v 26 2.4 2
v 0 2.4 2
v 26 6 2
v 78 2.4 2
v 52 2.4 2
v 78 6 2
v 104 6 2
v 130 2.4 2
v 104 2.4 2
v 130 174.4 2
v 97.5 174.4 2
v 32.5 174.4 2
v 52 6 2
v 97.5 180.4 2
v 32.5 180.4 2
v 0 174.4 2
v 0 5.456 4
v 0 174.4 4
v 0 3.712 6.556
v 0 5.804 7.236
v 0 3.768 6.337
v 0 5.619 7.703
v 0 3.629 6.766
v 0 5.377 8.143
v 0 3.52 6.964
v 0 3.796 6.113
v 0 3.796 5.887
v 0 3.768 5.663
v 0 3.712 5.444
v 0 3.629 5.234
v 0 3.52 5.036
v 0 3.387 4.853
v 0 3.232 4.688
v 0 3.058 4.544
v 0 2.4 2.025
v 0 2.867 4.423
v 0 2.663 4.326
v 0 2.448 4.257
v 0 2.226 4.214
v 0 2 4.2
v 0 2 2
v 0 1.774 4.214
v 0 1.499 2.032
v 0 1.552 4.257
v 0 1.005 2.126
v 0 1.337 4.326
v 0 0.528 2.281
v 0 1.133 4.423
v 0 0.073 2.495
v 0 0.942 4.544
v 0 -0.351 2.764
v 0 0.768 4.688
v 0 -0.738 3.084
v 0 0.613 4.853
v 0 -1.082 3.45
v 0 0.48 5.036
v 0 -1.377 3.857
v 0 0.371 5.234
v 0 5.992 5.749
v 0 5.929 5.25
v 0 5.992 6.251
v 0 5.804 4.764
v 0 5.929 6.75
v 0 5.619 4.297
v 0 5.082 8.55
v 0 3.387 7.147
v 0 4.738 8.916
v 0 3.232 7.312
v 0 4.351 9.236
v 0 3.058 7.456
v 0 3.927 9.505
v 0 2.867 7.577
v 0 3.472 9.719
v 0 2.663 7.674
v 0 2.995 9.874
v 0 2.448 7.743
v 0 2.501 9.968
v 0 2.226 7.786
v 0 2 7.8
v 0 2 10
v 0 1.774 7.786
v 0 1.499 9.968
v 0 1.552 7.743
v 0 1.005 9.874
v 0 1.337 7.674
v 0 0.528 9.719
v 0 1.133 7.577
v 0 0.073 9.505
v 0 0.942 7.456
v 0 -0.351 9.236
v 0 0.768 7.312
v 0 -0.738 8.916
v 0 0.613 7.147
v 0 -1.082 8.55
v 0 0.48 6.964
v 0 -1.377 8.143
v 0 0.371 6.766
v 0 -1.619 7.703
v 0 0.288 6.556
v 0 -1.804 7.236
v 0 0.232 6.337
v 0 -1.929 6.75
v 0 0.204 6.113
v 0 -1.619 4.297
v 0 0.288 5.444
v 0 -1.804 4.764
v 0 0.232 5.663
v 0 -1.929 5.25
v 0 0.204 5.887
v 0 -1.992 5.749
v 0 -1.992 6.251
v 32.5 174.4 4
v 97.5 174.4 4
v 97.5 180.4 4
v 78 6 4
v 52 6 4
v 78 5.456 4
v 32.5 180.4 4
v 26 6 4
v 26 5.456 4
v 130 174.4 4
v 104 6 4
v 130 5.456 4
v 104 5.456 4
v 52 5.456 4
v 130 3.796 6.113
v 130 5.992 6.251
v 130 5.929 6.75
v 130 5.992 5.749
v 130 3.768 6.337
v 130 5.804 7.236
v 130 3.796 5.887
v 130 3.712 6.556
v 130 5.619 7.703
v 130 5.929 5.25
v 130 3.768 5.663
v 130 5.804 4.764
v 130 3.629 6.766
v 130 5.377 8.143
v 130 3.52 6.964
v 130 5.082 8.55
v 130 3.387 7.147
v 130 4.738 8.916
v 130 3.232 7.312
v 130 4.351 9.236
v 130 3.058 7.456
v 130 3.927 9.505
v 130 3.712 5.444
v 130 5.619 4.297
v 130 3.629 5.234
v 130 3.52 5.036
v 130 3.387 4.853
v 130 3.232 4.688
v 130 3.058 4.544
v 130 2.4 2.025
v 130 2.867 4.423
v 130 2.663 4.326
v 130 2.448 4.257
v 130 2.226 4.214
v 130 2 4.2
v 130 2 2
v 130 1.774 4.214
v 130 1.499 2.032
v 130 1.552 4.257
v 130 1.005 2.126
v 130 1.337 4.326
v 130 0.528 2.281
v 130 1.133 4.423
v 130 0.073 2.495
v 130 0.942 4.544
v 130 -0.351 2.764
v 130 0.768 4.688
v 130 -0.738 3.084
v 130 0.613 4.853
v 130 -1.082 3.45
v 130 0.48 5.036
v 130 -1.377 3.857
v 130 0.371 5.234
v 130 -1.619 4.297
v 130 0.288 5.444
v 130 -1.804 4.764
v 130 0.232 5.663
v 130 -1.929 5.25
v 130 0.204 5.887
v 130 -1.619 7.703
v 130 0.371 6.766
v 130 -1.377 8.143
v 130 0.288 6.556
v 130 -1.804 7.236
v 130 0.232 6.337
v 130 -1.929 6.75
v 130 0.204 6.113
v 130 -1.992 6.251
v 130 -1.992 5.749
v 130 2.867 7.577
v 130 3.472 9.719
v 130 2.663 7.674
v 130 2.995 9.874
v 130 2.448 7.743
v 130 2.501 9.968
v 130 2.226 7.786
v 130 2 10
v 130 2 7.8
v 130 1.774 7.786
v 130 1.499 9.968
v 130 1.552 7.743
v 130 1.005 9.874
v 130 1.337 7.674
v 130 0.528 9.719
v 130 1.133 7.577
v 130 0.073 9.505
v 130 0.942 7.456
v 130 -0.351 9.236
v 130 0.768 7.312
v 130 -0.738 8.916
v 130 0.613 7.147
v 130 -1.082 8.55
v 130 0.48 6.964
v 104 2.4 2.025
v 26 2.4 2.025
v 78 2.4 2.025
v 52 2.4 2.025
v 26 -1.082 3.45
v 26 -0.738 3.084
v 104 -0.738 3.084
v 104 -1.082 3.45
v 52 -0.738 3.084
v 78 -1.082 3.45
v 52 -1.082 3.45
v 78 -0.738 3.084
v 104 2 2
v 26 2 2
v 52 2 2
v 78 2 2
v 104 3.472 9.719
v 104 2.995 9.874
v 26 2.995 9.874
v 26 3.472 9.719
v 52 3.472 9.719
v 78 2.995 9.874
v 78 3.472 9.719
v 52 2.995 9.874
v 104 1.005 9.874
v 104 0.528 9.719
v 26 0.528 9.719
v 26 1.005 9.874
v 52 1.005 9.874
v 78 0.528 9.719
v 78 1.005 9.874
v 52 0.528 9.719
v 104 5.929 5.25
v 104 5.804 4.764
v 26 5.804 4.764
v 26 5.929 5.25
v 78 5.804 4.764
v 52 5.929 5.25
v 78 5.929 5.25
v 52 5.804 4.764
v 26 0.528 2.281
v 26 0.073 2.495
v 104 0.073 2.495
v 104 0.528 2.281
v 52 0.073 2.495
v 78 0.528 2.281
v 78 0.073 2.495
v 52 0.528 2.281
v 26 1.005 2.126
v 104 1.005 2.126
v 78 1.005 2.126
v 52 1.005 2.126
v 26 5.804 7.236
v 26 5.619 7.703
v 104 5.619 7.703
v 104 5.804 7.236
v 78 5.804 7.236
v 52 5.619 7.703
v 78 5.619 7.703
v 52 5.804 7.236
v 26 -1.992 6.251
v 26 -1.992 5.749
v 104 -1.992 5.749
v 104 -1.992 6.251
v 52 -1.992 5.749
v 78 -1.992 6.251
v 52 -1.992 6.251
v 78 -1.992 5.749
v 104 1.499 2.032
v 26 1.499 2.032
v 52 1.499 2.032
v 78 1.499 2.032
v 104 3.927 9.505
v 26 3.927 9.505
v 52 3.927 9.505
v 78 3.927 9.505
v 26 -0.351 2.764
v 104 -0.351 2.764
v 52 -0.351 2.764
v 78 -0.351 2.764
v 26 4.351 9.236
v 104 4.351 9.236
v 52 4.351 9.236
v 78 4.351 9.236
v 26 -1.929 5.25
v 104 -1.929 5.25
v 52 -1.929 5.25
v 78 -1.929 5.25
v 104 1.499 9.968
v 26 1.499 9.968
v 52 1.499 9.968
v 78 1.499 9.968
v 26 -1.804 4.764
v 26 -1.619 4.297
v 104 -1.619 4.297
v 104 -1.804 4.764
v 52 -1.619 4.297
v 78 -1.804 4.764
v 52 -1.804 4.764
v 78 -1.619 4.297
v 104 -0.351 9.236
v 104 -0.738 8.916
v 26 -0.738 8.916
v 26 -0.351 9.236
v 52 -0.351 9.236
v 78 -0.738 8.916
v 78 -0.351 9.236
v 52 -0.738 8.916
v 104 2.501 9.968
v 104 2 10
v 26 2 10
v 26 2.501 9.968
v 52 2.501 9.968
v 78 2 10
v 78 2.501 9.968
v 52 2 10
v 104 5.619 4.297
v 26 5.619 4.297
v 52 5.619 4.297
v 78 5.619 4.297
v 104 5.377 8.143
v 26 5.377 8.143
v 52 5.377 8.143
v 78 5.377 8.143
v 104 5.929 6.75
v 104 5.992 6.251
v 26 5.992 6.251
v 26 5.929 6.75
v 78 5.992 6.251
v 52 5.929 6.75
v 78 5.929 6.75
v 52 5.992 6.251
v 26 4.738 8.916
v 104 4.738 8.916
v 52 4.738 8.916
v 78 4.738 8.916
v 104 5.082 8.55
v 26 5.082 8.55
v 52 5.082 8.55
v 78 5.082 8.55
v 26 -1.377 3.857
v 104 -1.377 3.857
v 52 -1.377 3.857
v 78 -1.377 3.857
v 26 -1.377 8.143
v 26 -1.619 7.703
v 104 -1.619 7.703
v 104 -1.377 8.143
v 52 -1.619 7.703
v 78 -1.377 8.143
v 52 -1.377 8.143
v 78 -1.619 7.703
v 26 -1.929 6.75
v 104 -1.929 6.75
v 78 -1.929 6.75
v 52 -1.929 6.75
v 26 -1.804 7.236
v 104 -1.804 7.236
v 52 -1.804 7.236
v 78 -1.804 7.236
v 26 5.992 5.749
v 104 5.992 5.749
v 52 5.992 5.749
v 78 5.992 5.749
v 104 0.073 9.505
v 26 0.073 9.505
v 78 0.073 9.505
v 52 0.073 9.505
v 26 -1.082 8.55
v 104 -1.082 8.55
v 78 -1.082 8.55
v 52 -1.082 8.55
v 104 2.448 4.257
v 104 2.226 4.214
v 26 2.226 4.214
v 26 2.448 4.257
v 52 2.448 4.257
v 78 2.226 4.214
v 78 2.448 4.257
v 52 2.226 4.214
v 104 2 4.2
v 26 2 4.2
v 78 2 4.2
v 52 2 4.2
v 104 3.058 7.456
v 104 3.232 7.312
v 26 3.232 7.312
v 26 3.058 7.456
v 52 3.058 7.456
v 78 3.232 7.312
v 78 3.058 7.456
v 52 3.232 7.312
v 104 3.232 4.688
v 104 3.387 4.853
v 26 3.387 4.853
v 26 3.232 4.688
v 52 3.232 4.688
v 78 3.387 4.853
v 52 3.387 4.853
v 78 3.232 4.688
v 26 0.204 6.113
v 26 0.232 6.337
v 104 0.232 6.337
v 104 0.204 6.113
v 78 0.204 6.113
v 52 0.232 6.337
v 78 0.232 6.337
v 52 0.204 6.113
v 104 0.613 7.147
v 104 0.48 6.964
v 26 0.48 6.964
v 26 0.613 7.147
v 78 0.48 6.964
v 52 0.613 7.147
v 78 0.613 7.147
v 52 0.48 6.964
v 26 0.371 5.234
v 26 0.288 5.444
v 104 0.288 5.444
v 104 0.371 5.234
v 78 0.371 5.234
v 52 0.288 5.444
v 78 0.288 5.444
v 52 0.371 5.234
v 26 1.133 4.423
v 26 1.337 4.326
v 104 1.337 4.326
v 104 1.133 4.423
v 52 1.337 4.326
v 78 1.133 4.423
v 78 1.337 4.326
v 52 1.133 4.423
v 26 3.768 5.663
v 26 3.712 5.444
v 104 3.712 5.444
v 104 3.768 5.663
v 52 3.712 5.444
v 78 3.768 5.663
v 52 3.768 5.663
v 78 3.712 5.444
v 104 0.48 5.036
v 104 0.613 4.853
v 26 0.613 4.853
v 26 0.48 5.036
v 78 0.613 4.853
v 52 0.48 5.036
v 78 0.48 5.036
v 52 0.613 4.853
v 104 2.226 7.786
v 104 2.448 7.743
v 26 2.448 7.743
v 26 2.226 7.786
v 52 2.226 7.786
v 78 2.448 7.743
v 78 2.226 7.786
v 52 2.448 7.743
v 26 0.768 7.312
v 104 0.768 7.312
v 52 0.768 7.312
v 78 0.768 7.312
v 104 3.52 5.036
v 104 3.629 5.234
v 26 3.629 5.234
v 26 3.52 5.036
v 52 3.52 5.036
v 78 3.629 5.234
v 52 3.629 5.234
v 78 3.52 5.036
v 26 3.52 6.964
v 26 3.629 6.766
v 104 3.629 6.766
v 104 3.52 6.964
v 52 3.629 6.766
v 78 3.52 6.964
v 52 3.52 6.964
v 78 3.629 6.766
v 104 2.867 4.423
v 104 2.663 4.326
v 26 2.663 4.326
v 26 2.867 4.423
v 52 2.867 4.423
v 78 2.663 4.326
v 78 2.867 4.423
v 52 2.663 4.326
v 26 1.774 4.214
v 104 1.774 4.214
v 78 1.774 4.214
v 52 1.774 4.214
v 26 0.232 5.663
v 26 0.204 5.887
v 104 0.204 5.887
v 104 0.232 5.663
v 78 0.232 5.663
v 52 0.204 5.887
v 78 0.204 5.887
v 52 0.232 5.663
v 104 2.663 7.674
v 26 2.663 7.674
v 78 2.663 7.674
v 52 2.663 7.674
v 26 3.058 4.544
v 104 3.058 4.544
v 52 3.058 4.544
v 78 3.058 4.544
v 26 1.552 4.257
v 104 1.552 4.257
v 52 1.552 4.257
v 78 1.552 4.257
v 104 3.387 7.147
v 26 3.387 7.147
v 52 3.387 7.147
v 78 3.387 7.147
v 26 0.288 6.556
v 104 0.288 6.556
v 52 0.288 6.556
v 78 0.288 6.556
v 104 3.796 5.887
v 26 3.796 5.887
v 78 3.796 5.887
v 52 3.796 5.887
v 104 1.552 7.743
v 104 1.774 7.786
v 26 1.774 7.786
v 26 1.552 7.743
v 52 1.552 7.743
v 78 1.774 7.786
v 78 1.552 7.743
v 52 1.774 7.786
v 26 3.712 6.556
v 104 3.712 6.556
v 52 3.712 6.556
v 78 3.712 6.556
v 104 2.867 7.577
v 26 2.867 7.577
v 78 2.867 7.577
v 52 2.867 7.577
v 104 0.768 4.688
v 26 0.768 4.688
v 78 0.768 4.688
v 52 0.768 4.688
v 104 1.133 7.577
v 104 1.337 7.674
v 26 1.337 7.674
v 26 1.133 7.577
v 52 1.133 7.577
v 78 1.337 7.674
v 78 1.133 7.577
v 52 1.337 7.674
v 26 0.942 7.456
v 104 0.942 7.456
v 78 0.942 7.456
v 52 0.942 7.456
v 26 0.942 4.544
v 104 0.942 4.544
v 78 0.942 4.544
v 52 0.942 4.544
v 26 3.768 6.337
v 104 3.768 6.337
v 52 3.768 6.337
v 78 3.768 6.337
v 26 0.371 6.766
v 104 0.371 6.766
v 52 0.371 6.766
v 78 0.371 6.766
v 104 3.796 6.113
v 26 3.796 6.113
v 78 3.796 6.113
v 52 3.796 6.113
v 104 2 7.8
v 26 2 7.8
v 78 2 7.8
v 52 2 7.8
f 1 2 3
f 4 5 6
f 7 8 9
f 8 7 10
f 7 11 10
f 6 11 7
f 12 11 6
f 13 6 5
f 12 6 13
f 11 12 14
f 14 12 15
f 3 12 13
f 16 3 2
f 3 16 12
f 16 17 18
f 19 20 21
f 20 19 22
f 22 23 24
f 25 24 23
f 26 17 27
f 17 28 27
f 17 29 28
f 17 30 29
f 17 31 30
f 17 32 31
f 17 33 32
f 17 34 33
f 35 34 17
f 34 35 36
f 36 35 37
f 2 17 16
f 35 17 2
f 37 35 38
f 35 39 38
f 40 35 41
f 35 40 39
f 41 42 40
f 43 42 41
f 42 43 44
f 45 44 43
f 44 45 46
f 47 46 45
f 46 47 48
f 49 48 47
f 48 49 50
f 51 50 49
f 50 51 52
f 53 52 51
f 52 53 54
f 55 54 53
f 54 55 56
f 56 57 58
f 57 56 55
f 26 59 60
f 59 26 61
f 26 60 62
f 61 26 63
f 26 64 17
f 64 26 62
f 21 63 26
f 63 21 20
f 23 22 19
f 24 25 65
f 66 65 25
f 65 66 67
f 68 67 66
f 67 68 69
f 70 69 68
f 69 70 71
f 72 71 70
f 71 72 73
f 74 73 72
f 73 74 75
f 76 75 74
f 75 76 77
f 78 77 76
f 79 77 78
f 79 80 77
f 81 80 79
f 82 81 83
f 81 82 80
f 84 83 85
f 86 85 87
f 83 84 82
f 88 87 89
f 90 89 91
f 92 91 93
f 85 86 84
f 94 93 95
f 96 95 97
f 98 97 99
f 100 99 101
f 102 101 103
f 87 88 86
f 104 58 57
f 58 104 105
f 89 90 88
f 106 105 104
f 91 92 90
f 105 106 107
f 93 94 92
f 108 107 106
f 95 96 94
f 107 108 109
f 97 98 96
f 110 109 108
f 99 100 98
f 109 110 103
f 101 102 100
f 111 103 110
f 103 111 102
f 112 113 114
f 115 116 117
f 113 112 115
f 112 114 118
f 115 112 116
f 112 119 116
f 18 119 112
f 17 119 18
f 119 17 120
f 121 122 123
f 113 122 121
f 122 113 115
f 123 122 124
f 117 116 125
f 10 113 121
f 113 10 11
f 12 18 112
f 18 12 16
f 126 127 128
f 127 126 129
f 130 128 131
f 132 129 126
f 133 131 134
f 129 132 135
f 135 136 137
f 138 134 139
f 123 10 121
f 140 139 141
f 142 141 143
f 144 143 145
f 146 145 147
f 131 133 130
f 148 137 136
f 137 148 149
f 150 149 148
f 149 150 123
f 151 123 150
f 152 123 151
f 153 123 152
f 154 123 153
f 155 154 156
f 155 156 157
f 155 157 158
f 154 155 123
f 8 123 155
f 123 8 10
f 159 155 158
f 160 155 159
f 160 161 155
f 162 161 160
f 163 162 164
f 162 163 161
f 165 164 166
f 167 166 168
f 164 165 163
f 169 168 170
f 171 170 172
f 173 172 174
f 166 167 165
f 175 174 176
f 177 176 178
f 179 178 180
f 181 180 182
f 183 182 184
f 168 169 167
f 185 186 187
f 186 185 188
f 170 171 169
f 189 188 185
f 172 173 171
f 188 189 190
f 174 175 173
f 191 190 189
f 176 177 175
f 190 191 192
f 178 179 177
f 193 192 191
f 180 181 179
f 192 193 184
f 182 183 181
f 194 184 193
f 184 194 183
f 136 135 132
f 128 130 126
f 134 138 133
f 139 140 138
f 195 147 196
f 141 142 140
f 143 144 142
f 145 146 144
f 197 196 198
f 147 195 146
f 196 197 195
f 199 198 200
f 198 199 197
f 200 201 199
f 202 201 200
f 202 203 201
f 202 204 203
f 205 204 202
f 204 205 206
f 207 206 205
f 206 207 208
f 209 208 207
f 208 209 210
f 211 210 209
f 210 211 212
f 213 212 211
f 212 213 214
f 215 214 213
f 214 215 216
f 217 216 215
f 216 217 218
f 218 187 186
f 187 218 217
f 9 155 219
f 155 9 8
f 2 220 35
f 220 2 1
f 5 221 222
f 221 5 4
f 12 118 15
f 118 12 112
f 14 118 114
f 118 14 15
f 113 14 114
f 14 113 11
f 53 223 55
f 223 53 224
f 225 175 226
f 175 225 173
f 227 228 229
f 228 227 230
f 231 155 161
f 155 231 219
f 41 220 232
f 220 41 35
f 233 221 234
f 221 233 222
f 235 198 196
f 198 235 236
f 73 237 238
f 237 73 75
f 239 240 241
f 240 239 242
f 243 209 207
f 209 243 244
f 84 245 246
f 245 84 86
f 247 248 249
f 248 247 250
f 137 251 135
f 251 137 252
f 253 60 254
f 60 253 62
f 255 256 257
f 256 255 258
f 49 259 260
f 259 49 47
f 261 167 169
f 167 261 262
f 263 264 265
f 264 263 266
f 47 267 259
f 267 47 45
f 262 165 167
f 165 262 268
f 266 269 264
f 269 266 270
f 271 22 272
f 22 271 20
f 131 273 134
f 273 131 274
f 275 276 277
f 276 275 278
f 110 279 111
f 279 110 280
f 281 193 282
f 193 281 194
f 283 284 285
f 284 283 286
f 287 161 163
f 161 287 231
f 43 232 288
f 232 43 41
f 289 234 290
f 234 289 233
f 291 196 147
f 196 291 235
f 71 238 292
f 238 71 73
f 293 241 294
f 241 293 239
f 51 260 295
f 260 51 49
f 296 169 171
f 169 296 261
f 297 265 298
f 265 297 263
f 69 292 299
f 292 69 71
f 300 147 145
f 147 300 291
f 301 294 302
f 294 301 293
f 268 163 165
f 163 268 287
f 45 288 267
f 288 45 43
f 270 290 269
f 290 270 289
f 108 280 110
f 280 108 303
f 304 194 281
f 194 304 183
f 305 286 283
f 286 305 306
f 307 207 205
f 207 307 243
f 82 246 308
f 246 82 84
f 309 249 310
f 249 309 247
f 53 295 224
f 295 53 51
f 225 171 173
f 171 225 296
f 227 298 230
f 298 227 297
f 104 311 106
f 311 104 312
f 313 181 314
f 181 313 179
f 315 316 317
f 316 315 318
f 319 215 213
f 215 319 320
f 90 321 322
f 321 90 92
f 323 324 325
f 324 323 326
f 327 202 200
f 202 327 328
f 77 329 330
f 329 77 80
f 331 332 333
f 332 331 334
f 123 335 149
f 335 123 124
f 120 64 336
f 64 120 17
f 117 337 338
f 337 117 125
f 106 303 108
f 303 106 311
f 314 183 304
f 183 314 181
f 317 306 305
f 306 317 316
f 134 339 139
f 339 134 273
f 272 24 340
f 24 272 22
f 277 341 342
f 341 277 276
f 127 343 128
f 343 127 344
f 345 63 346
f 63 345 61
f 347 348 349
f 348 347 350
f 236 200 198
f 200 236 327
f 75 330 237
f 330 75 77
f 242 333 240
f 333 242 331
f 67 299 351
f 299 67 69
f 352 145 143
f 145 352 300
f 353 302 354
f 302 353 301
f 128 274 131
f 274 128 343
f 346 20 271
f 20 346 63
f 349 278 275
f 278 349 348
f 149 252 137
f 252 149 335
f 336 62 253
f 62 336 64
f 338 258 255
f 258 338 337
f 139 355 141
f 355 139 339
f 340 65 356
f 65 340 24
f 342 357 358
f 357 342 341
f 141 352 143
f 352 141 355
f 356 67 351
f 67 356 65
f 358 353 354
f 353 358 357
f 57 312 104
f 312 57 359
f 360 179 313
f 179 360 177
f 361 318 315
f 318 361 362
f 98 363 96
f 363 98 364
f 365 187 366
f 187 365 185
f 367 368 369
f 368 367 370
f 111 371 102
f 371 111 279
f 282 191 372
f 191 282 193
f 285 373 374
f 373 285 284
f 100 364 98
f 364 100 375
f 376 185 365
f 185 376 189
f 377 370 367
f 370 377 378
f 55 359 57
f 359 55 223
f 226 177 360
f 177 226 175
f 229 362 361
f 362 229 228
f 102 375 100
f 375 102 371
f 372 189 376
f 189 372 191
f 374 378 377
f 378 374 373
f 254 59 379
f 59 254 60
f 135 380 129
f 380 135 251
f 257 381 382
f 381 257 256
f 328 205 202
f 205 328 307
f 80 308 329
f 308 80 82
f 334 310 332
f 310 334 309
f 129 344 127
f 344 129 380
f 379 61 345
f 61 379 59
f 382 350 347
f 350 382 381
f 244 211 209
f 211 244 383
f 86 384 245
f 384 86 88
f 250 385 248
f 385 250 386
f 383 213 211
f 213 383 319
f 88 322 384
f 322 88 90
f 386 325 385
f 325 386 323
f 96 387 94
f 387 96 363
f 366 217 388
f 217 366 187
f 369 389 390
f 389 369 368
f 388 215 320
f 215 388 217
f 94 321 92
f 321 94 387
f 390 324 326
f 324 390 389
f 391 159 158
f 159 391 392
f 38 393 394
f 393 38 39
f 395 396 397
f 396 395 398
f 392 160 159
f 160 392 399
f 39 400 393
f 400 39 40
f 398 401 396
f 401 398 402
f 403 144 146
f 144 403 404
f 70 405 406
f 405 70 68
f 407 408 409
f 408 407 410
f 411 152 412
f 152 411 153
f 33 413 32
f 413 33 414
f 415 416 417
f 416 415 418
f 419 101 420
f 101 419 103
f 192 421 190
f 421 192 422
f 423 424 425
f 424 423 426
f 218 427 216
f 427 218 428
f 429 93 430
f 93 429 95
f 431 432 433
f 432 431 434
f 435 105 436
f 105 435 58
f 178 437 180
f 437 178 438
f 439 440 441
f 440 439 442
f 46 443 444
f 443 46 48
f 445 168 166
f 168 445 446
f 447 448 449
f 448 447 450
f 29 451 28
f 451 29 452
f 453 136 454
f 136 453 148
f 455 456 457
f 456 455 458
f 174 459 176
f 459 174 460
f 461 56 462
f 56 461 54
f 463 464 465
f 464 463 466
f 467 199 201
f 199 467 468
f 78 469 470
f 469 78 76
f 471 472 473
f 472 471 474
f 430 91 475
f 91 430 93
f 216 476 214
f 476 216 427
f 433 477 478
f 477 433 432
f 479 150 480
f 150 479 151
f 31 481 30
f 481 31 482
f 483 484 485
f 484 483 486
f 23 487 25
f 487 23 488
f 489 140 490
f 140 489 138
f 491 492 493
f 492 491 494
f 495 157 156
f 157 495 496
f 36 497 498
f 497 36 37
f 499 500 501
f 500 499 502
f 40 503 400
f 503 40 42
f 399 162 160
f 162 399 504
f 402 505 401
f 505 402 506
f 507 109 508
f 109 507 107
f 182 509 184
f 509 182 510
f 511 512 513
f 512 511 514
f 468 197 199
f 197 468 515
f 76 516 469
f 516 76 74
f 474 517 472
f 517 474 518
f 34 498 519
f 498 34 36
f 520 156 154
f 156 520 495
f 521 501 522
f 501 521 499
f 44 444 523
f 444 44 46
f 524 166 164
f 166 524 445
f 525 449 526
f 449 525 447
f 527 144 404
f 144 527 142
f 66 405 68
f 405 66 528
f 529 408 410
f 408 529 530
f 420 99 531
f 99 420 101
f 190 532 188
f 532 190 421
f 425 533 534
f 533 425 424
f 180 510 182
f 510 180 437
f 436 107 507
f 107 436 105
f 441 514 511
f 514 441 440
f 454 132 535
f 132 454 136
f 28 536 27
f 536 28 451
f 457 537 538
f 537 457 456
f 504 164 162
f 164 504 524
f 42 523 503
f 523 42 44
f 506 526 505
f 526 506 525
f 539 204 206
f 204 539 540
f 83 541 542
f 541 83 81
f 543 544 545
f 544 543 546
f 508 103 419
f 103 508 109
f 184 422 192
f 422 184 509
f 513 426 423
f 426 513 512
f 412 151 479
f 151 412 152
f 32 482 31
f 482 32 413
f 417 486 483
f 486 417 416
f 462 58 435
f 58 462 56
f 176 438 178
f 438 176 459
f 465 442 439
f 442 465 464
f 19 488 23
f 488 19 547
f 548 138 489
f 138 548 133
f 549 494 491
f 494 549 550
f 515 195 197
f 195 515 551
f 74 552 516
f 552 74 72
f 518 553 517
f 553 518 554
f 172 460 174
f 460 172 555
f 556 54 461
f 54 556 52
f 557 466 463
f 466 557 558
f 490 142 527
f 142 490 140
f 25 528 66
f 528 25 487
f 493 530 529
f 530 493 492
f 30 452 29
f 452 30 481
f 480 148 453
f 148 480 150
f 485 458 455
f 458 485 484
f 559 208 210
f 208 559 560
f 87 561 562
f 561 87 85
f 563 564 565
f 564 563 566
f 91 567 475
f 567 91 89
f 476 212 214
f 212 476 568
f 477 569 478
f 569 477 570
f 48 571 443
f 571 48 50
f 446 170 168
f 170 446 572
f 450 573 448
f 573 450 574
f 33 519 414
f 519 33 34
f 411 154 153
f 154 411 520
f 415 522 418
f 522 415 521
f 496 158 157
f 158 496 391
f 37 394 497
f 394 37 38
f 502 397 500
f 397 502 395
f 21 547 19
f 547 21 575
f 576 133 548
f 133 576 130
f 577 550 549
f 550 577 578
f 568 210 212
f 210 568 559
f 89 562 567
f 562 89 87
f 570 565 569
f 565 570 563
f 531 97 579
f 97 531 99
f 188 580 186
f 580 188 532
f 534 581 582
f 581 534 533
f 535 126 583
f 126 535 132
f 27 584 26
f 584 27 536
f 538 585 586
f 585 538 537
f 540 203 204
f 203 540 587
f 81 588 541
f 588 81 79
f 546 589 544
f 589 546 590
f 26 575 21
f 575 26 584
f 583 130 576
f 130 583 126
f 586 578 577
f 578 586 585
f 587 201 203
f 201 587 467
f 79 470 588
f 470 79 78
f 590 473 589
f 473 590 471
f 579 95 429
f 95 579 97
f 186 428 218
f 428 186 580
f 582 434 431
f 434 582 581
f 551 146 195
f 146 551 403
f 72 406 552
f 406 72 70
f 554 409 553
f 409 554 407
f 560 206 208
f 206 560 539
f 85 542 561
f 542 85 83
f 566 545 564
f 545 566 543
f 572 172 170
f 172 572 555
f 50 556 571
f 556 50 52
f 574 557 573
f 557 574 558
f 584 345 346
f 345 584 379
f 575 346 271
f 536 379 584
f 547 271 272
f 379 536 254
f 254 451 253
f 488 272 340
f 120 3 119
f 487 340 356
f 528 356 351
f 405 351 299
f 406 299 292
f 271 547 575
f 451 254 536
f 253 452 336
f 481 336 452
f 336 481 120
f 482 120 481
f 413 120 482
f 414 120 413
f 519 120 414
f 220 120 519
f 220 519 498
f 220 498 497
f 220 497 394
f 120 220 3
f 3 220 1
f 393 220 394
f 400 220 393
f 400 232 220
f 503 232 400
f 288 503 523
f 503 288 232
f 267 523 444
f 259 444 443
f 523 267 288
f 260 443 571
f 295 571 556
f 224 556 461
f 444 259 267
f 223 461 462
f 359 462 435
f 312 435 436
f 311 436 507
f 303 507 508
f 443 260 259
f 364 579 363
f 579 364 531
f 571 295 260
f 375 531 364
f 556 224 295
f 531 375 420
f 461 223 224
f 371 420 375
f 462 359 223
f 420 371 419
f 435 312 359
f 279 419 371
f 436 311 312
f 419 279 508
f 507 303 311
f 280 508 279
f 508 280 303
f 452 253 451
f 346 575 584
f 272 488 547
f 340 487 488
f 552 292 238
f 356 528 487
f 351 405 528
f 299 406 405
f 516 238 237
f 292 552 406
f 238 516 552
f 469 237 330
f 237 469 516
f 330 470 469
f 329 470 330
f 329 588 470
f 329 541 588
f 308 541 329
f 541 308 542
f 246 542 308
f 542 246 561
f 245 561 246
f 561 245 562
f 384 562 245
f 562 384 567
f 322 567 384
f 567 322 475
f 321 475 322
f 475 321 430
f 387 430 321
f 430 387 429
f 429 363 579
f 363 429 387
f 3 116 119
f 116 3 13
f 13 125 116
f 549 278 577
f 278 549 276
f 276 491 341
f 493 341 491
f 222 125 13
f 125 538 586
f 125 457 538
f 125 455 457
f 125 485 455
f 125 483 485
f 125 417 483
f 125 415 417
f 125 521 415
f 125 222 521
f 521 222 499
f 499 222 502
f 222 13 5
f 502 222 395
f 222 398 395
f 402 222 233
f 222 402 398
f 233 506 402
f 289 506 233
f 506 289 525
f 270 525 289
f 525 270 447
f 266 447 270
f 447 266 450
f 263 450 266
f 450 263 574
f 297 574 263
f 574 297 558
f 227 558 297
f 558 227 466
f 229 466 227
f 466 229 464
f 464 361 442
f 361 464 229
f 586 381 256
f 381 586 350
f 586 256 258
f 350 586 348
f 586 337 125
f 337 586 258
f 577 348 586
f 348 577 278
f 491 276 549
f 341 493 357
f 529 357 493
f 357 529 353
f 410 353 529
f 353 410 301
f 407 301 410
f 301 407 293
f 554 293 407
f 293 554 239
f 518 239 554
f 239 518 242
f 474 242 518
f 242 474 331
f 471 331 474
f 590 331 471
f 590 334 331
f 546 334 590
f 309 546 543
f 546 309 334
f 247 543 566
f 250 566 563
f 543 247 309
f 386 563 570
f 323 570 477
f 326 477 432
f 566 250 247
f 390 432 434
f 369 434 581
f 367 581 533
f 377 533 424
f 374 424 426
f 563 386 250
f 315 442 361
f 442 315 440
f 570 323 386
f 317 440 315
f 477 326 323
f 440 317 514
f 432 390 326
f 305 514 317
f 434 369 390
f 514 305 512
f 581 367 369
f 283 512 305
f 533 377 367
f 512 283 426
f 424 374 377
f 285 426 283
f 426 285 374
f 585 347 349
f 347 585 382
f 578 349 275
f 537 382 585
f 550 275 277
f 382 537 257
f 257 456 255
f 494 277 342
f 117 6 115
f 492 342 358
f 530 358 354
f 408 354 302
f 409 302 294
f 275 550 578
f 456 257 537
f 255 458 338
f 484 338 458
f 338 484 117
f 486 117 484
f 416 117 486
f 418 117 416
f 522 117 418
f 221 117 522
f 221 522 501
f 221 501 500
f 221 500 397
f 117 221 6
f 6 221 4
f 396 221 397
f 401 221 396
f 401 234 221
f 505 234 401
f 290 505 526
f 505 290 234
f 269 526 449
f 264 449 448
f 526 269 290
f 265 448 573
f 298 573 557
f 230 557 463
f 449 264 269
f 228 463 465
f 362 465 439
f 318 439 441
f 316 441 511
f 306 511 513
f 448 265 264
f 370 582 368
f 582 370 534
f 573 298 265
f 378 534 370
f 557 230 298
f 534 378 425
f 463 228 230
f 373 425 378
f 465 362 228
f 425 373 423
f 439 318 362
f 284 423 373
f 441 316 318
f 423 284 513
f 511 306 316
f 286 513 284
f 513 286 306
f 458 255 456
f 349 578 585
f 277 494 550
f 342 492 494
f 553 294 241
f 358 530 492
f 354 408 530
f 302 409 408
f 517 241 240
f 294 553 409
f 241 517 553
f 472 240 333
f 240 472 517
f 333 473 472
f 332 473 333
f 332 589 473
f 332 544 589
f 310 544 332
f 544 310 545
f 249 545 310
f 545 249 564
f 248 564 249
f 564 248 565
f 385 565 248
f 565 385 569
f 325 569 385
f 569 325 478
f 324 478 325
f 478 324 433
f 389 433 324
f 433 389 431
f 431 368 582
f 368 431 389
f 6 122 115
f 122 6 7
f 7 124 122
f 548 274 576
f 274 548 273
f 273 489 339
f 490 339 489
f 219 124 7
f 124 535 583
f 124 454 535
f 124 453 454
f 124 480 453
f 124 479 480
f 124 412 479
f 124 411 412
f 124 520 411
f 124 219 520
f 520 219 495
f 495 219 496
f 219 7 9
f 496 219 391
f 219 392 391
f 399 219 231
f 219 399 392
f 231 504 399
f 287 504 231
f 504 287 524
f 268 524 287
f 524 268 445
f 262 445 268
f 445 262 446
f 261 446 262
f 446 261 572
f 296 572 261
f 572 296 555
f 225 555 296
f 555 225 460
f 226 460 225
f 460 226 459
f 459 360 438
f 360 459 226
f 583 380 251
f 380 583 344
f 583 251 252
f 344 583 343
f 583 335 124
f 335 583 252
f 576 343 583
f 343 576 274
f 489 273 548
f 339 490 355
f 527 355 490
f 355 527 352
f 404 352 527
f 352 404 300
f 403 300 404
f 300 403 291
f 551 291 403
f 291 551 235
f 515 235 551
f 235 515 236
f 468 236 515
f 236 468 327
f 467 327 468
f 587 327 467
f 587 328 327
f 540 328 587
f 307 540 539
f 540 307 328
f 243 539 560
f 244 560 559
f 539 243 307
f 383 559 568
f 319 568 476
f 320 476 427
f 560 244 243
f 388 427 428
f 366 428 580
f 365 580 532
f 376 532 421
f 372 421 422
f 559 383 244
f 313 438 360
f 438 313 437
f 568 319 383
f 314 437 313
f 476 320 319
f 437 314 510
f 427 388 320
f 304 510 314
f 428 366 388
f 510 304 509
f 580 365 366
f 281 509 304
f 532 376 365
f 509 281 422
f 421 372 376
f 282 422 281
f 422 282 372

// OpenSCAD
$fn = 50;

// Dimensions
//width = 87;
//length = 130;
depth = 13.5;

width = 174;
length = 130;

thickness = 2;

radius=20;

rows = 2;
cols = 3;

lip = 10;
hindge = 4;
hindgeCore = 1.8;

//base();
color("green") translate([0, hindge-thickness, lip-hindge]) rotate([0, 0, 0]) lid();

/*
color("blue") {
    translate([0, 0, 0]) tray(130, 87);
    translate([0, width/2, 0]) tray(130, 87);
}
*/

tabs = 5;
tabLength = (length)/tabs;

handle=length/2;

module lid() {
    difference() {
        union() {
            translate([0, thickness-2*hindgeCore + thickness, -hindge]) {
                linear_extrude(height=thickness) {
                    square([length, width-thickness]);
                }
                
                linear_extrude(height=thickness) {
                    translate([(length - handle)/2,width - thickness,0])
                        square([handle, thickness*3]);
                }
            }
            
            translate([0, 0, 0]) {
                rotate([0, 90, 0]) {
                    difference() {
                        cylinder(r=hindge, h=length);
                        cylinder(r=hindgeCore, h=length);
                    }
                }
            }
        }
        
        translate([0, -thickness, -hindge-thickness])
            tabCutout(1);
    }
}

module tabCutout(_offset) {
    translate([0, 0, lip-hindge*2])
    for(x = [_offset:2:tabs-1]) {
        translate([x*tabLength,-thickness, 0]) {
            linear_extrude(height=hindge*2)
                square([tabLength, hindge*2]);
        }
    }
}

module base() {
    difference() {
        union() {
            difference() {
                translate([-thickness, -thickness, -depth - thickness])
                    cube([length + thickness*2, width + 2*thickness, (depth + thickness) + lip]);

                translate([0, 0, -depth])
                    cube([length, width, depth + lip]);
                
                translate([-thickness, -thickness, lip-hindge])
                    cube([length+thickness*2, hindge, hindge,]);
            }

            difference() {
                translate([-thickness, hindge-thickness, lip-hindge])
                    rotate([0, 90, 0])
                        cylinder(r=hindge, h=length + thickness*2);
            }
        }

        translate([-thickness, (hindge-thickness), lip-hindge])
                    rotate([0, 90, 0])
                        cylinder(r=hindgeCore, h=length + thickness*2);
        
        tabCutout(0);
        
        
        translate([(length - handle)/2, width,thickness])
            cube([handle, thickness, lip-thickness]);
    }
}

module tray(length, width) {
    xOffset = (length - (cols*radius*2))/(cols+1);
    yOffset = (width - (rows*radius*2))/(rows+1);
    zOffset = radius - depth;

    difference() {
        intersection() {
            translate([0, 0, -depth])
                cube([length, width, depth]);
            
            union() {
                translate([radius, radius, -thickness])
                    linear_extrude(height=thickness)
                        offset(r=radius)
                            square([length-2*radius,width-2*radius]);
                
                translate([radius+xOffset, radius+yOffset, zOffset]) {
                    for(x = [0:cols-1]) {
                        for(y = [0:rows-1]) {
                            translate([x * (xOffset + 2*radius), y * (yOffset + 2*radius), 0]) {
                                sphere(radius);
                            }
                        }
                    }
                }
            }
        }

        translate([radius+xOffset, radius+yOffset, zOffset]) {
            for(x = [0:cols-1]) {
                for(y = [0:rows-1]) {
                    translate([x * (xOffset + 2*radius), y * (yOffset + 2*radius), 0]) {
                        sphere(radius-thickness/2);
                    }
                }
            }
        }
    }
}
